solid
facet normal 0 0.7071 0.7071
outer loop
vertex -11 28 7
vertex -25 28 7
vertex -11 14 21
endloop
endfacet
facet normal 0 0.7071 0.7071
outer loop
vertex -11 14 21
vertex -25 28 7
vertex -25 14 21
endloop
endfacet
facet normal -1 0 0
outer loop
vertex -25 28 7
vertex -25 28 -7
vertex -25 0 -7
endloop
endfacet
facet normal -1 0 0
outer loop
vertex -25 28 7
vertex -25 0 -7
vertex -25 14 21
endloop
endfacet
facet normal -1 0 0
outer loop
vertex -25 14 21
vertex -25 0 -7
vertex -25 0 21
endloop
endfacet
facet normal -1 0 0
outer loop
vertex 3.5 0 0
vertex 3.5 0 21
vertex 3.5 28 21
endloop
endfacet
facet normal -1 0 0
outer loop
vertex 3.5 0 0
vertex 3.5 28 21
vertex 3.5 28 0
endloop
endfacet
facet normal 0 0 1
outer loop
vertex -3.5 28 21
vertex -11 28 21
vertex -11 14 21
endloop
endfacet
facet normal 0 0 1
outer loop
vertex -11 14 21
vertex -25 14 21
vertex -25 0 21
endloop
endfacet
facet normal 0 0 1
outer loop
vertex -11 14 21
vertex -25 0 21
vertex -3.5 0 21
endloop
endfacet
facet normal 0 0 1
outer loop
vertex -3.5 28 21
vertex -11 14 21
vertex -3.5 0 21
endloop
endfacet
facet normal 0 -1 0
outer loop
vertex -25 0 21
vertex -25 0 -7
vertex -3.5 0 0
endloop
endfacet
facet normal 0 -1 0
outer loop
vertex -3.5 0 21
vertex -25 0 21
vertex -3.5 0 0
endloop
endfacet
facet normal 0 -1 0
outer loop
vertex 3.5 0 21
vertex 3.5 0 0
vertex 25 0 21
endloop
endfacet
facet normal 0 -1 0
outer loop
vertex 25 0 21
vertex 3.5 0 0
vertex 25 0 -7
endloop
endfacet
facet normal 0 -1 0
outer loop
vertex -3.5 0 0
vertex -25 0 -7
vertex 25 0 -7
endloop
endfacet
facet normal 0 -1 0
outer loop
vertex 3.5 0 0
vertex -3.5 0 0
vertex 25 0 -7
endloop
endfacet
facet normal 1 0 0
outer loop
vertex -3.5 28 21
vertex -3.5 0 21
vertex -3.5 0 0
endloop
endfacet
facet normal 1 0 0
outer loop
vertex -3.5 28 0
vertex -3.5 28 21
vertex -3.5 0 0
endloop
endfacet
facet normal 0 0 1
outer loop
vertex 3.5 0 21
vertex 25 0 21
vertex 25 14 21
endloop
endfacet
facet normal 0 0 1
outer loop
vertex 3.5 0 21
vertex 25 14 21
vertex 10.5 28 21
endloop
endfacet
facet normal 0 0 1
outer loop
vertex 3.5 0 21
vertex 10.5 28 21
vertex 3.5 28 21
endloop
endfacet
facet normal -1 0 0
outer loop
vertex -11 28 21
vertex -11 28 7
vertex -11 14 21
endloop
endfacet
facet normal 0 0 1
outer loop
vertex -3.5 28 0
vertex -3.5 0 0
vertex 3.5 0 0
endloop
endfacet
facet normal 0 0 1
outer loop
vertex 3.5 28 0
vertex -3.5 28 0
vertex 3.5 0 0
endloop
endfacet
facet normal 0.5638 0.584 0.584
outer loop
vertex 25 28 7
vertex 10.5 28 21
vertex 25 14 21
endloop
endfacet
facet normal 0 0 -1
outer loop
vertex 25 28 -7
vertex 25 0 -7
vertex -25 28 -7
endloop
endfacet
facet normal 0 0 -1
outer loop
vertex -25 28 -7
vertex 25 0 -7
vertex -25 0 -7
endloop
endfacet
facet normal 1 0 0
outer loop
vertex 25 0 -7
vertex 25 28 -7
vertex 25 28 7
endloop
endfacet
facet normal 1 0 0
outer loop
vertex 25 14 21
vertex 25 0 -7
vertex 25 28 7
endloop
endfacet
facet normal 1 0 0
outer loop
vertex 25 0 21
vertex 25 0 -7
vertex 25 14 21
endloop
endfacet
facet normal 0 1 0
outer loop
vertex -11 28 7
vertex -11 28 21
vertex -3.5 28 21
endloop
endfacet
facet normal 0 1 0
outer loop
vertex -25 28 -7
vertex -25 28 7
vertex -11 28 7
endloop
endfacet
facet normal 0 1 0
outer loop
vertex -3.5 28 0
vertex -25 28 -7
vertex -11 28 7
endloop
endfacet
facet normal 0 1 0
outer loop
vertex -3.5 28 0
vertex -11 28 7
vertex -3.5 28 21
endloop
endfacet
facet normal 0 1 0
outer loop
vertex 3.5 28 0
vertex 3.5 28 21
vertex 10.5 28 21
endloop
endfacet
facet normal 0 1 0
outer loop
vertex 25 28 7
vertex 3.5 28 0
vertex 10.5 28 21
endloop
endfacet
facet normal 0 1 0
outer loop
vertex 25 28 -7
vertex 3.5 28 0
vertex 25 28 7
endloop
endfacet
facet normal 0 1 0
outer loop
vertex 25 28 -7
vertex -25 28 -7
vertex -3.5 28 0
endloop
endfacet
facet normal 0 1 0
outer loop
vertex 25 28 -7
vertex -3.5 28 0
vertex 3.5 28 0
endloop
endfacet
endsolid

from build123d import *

# Parameters (mm, degrees)
BOSS_EXTRUDE1_DEPTH = 28
CHAMFER1_START      = 34.535646335
CHAMFER1_OUTLINE_W  = 20
CHAMFER1_OUTLINE_H  = 22
CHAMFER1_DEPTH      = 9.464353665
CUT_EXTRUDE1_DEPTH  = 14


with BuildPart() as part:
    # Sketch1 → Boss-Extrude1 (new body)
    with BuildSketch(Plane(origin=(0, 0, 0), x_dir=(1, 0, 0), z_dir=(0, 1, 0))):
        Polygon((0, 0), (0, 7), (25, 7), (25, -21), (3.5, -21), (3.5, 0), align=None)
    extrude(amount=BOSS_EXTRUDE1_DEPTH)

    # Mirror1: part across plane


with BuildPart() as part_1:
    add(part.part)
    add(part.part.mirror(Plane(origin=(0, 28, 0), x_dir=(0, 0, 1), z_dir=(1, 0, 0))))

    # Chamfer1: read off the stored shape, not the designer's step
    # Chamfer1 outline → Chamfer1 (cut)
    with BuildSketch(Plane(origin=(0, 0, 0), x_dir=(0.8258790691262022, -0.39870024026782175, -0.39870024026782164), z_dir=(0.5638472871081651, 0.5839846902191711, 0.583984690219171)).offset(CHAMFER1_START)):
        with Locations((-2, 5)):
            Rectangle(CHAMFER1_OUTLINE_W, CHAMFER1_OUTLINE_H)
    extrude(amount=CHAMFER1_DEPTH, mode=Mode.SUBTRACT)

    # Sketch2 → Cut-Extrude1 (cut)
    with BuildSketch(Plane.ZY.offset(25)):
        Polygon((21, 28), (7, 28), (21, 14), align=None)
    extrude(amount=-CUT_EXTRUDE1_DEPTH, mode=Mode.SUBTRACT)


solid = part_1.part
